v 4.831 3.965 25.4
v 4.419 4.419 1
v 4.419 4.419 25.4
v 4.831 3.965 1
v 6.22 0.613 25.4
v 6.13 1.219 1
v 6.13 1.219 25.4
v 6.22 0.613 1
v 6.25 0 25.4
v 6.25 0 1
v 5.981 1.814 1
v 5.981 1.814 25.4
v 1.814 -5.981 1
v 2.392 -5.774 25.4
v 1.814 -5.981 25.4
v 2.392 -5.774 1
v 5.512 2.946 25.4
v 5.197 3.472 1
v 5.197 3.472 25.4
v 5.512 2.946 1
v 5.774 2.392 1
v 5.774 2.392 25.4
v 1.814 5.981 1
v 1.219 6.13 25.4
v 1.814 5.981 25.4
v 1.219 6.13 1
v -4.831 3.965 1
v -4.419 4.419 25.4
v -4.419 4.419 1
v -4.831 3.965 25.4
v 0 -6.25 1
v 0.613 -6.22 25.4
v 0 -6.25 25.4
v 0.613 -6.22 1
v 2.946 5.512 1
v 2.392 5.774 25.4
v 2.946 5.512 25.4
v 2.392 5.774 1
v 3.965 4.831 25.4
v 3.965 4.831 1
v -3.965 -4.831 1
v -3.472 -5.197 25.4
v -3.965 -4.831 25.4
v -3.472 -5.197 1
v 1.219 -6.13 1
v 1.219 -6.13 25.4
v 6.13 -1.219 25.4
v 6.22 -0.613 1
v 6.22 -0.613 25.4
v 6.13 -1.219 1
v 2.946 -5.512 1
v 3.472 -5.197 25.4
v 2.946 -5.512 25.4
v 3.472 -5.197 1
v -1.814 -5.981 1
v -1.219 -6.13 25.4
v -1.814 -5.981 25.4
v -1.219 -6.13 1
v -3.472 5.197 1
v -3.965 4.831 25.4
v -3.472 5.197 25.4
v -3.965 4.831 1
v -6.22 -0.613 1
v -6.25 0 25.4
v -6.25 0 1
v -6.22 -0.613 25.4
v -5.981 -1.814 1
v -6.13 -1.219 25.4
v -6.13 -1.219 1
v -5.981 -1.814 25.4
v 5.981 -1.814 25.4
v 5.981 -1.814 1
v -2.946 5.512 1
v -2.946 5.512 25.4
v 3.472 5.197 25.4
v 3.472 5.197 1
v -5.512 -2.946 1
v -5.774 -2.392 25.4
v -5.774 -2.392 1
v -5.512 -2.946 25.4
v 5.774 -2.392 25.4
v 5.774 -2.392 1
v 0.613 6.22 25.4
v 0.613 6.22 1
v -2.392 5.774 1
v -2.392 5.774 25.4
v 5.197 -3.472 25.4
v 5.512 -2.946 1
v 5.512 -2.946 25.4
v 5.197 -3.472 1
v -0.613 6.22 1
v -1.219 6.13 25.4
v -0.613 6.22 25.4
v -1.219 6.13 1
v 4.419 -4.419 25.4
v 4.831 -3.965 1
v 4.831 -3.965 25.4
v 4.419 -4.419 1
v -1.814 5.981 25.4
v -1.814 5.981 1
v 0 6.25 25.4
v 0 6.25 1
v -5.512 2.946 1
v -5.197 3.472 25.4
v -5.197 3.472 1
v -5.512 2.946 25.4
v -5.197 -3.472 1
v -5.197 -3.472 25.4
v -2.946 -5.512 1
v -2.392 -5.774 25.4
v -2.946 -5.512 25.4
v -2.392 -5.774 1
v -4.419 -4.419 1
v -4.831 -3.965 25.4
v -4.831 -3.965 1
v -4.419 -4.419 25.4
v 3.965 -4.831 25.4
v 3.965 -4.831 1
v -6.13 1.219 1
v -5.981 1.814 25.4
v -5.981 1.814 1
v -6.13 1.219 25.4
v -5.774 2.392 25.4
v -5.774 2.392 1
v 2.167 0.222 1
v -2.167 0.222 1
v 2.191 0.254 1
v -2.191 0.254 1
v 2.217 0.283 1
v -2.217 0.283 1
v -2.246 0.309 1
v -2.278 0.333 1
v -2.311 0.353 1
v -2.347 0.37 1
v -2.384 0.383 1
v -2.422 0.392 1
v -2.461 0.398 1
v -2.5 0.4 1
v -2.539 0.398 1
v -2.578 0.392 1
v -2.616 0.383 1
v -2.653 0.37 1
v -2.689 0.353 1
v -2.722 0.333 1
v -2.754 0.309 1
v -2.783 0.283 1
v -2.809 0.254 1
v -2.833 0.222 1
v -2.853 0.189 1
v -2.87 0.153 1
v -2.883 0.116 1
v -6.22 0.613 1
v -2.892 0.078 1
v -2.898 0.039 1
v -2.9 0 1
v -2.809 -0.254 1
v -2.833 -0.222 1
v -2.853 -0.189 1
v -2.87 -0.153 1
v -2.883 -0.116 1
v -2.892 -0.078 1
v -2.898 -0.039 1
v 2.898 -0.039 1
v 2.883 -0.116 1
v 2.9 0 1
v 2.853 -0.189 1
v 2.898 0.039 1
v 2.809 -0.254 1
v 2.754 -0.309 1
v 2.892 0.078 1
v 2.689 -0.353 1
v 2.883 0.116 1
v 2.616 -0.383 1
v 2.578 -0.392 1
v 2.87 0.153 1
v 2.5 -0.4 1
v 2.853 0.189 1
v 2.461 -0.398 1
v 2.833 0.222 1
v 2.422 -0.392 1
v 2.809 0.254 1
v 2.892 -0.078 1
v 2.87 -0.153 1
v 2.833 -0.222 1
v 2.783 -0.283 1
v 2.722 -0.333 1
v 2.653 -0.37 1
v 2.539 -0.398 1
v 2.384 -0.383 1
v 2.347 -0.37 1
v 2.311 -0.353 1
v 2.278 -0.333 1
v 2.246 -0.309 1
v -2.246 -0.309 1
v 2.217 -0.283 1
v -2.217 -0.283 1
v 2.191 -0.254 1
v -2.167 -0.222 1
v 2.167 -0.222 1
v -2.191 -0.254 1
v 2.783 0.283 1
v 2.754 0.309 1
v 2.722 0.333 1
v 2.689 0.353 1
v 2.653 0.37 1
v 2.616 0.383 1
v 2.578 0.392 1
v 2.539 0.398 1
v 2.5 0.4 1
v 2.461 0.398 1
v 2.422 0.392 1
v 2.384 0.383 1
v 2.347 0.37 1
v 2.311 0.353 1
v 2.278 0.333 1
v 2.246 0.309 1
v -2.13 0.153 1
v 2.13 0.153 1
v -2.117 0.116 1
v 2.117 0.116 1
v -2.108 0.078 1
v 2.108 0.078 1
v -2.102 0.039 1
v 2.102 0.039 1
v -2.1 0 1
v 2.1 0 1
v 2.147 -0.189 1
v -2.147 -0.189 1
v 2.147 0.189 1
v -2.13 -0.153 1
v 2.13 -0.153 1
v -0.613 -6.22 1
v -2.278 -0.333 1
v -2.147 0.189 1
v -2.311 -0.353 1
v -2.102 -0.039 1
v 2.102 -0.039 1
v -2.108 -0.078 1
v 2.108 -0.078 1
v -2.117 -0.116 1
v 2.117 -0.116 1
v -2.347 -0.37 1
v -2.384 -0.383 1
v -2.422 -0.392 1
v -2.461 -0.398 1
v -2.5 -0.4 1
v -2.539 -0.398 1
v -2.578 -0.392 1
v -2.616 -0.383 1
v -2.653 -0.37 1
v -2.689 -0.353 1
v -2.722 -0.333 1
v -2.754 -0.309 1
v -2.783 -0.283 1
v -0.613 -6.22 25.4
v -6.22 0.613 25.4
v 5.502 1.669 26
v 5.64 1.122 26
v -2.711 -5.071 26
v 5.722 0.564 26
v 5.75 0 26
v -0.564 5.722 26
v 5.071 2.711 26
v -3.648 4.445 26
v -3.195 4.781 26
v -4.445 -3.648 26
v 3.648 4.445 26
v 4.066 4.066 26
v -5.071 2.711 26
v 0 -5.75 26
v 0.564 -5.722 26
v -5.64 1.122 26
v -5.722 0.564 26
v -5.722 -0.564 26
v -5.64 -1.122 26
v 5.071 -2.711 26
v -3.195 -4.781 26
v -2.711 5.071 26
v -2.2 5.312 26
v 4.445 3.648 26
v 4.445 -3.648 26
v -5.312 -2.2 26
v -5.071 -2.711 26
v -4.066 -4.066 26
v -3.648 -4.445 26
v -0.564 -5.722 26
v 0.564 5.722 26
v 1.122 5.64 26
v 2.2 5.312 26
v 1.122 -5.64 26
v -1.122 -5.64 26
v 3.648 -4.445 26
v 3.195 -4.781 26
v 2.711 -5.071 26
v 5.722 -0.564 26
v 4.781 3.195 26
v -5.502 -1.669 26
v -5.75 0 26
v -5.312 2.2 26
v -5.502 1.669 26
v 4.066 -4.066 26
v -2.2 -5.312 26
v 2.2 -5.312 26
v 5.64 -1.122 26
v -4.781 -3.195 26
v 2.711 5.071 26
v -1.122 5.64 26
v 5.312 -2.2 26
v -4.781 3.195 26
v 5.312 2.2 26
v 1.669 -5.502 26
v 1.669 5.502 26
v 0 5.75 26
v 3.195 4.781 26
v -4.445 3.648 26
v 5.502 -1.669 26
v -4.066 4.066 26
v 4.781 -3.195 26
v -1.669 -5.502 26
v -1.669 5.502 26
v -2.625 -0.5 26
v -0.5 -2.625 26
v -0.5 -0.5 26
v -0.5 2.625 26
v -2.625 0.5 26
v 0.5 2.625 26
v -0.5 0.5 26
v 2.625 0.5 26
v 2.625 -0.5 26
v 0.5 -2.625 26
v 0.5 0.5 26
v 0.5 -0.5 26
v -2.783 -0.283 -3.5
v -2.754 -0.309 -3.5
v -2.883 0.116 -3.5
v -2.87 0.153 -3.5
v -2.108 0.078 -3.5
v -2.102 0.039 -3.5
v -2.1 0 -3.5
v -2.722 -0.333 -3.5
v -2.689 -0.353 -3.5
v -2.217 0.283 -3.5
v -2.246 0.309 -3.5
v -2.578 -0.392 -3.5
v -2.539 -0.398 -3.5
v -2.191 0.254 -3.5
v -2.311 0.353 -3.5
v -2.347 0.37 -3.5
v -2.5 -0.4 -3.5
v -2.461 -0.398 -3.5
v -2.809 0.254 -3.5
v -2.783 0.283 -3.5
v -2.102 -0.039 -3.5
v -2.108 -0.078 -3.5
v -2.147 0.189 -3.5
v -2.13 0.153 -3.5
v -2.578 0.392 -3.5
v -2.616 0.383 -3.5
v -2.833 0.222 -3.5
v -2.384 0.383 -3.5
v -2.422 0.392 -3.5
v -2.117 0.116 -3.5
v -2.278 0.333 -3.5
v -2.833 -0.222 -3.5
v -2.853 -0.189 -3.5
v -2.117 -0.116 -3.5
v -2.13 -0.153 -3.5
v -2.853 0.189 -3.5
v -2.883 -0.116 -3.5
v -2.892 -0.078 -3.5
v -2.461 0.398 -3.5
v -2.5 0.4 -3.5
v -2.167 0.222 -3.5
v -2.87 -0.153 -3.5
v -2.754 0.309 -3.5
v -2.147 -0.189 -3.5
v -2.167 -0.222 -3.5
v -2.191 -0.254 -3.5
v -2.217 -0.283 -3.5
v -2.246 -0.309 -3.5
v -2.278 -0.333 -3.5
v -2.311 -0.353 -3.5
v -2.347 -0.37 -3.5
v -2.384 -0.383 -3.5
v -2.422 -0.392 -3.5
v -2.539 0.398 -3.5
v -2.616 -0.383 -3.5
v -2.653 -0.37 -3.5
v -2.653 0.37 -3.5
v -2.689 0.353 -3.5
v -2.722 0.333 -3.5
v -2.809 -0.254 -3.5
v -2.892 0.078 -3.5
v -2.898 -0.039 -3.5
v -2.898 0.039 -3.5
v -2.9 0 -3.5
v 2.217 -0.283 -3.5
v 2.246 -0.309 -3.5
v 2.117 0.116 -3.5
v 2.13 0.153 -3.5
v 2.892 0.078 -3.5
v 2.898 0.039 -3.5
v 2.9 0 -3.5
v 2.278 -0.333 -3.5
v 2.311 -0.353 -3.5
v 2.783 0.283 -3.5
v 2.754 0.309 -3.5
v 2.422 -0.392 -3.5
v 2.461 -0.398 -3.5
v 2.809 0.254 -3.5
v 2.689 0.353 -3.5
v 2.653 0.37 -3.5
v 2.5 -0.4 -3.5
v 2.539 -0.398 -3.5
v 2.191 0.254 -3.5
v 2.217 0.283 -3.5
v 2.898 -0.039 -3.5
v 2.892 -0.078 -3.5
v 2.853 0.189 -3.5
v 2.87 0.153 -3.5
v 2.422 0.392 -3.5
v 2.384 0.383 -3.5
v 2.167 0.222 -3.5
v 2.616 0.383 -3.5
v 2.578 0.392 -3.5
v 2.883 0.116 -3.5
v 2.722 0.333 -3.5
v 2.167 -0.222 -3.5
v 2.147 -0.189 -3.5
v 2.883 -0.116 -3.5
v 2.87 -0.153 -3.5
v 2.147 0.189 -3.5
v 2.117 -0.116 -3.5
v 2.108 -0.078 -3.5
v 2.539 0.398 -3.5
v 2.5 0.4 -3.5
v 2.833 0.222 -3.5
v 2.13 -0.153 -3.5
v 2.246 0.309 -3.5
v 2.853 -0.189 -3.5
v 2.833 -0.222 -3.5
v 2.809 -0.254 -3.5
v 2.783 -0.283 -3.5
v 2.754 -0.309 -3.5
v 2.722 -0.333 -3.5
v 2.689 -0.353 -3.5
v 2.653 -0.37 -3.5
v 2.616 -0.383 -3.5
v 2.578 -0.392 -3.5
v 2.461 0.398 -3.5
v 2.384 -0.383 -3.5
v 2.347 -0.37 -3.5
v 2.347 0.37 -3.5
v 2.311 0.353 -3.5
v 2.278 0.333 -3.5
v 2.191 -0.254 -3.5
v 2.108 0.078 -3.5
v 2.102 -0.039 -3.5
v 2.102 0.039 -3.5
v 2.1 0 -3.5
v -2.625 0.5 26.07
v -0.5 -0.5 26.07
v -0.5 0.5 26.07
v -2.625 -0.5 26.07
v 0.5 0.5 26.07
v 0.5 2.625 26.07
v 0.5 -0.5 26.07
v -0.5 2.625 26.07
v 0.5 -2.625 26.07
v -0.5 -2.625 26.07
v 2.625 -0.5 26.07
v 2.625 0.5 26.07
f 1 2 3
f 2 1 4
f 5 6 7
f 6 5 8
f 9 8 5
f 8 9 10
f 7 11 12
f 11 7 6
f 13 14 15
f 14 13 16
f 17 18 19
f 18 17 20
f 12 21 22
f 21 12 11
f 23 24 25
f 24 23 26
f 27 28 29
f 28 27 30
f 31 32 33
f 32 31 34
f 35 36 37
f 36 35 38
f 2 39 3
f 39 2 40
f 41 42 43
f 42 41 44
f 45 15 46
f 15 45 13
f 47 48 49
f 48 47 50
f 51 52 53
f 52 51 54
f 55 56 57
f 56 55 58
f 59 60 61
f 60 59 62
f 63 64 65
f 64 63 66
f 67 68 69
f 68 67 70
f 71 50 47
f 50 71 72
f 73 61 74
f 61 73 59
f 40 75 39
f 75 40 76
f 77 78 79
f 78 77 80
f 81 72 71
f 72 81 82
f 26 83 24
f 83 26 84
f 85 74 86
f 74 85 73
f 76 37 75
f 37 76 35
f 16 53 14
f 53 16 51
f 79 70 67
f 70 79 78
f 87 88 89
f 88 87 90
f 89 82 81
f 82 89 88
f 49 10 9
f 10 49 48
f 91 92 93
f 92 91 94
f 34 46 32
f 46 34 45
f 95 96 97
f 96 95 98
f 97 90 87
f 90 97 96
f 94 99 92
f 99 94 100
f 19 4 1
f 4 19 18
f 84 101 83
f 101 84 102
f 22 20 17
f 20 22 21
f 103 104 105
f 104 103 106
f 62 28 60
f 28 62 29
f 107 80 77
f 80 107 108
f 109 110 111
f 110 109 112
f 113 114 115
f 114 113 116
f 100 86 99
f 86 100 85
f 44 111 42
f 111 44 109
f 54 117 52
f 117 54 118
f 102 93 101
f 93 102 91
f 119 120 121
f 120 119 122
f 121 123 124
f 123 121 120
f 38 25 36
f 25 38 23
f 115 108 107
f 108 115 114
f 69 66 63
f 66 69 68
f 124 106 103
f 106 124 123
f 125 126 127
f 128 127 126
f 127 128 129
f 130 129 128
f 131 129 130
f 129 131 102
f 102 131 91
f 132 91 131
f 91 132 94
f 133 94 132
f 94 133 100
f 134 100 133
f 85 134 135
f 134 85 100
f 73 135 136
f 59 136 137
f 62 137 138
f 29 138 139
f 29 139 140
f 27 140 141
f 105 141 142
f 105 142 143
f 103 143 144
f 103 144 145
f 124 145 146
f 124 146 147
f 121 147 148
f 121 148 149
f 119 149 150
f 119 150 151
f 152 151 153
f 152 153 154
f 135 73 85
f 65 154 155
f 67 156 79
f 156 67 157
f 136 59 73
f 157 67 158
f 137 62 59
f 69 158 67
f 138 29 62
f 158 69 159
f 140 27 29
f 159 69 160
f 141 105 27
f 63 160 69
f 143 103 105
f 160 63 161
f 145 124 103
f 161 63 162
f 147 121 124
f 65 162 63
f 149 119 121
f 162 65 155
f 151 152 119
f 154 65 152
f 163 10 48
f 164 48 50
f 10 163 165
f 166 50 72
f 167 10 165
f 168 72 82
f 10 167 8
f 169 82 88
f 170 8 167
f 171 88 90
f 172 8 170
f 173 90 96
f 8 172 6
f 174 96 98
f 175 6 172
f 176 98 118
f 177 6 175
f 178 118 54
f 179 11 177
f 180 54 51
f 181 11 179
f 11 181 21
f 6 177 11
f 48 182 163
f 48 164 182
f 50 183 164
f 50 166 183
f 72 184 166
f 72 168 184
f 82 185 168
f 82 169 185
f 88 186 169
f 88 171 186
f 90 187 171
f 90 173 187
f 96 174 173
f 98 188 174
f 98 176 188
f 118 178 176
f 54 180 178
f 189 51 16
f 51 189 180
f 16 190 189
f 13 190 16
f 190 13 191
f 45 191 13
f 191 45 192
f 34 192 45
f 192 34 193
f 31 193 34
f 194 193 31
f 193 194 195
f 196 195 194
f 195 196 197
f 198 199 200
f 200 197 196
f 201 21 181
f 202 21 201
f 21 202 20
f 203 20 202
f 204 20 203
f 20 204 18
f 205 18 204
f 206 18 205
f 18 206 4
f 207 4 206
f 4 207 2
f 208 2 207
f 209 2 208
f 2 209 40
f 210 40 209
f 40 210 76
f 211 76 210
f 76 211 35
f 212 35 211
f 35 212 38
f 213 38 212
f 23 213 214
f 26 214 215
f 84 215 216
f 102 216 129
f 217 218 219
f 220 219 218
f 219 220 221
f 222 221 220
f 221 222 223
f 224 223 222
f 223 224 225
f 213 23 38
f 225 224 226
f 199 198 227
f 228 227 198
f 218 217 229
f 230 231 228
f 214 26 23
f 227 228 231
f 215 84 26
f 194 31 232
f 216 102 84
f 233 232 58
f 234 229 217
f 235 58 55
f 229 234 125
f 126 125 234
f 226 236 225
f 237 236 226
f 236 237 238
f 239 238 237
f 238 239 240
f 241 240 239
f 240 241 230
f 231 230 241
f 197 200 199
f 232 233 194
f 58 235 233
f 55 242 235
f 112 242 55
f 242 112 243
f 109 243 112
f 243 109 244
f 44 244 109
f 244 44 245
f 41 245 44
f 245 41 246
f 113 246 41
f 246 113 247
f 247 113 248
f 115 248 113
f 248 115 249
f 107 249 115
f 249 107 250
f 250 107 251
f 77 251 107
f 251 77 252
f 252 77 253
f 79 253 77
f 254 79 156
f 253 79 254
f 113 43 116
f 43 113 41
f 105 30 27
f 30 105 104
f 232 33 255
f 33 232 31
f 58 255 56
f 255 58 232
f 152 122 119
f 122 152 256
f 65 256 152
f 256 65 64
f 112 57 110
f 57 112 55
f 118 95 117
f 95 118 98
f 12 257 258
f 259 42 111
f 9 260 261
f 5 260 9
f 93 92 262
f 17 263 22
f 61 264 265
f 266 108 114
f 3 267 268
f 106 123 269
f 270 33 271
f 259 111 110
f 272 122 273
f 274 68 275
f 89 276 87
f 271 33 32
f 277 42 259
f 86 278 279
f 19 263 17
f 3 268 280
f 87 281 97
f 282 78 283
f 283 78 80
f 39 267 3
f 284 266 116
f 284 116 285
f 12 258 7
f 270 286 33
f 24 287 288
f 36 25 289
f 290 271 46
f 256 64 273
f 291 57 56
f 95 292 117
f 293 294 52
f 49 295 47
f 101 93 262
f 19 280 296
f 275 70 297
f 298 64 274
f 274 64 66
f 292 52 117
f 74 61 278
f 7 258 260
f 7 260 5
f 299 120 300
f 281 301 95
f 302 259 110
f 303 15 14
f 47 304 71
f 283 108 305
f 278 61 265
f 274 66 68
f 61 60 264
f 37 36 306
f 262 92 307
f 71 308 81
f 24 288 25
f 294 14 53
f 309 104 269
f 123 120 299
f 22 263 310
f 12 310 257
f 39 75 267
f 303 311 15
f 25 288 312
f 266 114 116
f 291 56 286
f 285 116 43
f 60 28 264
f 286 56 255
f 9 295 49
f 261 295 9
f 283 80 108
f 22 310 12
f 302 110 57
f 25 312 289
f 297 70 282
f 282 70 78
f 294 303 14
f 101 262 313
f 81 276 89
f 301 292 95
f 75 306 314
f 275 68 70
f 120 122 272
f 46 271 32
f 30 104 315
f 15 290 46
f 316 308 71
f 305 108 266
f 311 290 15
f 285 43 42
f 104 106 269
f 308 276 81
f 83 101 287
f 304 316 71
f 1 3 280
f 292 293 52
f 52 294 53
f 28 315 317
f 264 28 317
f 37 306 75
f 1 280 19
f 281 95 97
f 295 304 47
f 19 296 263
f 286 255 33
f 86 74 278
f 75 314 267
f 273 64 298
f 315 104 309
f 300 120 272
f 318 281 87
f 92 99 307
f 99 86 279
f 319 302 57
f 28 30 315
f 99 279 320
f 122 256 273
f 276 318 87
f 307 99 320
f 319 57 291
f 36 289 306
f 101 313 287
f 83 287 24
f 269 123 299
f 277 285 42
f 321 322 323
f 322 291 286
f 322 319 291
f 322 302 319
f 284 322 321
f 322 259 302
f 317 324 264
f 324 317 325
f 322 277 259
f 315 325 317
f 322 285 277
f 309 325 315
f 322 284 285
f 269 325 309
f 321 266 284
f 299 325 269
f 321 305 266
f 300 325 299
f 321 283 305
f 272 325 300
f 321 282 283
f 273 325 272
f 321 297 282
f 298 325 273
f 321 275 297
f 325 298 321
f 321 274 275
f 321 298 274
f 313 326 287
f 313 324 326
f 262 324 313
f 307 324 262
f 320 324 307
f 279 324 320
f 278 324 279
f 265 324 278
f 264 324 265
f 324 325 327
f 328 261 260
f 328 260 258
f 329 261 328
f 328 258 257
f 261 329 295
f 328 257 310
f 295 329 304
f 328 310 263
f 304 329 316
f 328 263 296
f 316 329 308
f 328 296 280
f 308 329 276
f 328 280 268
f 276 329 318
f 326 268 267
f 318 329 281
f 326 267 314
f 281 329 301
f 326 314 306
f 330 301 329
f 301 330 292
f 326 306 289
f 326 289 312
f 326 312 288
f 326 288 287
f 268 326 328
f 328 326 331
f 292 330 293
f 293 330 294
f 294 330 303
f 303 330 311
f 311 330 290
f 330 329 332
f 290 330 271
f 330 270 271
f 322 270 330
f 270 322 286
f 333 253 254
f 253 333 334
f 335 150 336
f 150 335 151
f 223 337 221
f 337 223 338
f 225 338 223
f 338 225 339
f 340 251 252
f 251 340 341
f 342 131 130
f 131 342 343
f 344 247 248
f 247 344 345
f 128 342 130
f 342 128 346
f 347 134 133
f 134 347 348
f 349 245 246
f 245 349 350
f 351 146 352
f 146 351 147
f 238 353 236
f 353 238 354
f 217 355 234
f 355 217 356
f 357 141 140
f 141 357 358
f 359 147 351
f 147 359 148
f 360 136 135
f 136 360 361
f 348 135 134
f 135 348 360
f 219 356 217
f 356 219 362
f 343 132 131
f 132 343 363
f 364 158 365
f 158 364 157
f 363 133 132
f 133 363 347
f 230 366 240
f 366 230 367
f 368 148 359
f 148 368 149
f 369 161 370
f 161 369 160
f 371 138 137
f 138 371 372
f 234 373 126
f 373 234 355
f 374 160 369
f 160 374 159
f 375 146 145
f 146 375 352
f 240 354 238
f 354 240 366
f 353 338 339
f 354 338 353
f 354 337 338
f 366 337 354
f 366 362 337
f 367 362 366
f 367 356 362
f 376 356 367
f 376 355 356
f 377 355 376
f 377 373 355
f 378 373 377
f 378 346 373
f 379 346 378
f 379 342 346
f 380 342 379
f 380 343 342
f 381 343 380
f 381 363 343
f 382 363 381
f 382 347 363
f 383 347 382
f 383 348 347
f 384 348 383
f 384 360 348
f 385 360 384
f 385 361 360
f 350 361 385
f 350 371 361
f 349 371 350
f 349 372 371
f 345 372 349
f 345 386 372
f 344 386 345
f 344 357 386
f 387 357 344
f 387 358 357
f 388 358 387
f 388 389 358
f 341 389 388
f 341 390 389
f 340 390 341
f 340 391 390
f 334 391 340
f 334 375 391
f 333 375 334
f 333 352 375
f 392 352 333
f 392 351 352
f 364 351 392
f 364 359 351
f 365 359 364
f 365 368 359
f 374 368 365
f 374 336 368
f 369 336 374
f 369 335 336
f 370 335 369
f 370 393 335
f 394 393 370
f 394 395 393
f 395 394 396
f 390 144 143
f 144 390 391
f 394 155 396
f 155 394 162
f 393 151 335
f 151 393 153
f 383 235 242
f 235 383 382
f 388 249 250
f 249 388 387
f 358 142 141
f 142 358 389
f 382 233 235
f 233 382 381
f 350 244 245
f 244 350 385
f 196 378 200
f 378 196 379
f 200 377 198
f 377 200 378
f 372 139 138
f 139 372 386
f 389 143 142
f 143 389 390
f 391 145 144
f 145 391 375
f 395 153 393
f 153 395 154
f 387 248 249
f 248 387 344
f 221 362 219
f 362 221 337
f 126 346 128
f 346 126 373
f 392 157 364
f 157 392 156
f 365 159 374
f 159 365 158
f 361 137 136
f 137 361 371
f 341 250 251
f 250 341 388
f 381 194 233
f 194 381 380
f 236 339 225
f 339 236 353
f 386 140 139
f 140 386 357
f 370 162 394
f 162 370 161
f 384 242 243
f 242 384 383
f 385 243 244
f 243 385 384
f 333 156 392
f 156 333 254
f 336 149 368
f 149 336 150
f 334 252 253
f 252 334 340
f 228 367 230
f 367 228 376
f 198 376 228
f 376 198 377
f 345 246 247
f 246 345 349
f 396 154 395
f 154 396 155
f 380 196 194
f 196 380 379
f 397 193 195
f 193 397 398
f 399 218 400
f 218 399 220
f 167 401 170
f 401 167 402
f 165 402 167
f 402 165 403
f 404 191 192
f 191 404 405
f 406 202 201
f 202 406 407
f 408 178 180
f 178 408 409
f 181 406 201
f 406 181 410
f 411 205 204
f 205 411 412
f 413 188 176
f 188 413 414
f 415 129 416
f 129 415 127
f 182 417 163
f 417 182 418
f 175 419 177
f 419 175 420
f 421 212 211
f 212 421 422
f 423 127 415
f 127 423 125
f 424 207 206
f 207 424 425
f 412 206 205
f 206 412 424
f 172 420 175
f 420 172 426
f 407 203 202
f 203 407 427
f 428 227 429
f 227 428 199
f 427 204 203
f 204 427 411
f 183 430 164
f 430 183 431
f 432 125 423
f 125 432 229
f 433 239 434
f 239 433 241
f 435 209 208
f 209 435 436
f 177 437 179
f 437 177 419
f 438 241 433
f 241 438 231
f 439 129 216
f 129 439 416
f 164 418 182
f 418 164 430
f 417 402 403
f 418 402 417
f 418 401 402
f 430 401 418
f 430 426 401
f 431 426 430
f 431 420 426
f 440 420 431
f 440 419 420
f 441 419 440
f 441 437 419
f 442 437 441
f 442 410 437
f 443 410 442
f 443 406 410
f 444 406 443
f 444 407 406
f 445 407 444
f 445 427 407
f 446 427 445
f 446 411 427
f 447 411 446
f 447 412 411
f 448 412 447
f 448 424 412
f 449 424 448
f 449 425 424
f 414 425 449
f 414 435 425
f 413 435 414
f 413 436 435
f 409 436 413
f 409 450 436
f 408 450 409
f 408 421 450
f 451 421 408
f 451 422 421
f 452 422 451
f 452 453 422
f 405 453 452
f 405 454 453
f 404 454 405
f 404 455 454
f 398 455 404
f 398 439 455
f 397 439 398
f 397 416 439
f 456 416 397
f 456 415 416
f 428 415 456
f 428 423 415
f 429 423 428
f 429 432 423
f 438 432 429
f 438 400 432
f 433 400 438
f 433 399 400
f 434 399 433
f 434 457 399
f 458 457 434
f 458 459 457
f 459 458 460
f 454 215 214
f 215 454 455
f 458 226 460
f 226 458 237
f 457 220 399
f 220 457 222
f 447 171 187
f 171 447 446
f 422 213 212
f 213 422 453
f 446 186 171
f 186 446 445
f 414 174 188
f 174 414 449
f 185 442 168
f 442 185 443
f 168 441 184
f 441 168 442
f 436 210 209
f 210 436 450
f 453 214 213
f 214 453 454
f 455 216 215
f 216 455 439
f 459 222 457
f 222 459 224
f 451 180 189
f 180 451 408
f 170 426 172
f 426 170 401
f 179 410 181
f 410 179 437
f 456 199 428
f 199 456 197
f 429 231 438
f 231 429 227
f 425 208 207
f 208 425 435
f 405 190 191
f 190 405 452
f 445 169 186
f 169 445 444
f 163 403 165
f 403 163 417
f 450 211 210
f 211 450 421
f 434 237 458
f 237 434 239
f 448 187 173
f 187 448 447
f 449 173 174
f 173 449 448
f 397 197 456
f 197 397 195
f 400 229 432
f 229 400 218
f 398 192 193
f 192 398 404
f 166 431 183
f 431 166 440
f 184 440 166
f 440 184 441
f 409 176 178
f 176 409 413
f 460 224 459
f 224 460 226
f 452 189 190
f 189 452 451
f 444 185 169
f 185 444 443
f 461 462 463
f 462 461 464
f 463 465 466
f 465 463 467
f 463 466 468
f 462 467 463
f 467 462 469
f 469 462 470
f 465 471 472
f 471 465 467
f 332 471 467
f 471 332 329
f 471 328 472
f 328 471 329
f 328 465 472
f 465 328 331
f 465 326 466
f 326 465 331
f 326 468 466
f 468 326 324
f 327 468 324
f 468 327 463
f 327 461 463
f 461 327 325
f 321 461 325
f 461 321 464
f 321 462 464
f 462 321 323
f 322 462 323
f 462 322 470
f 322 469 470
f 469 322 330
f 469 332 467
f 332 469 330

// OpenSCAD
$fn = 64;

body_diameter = 12.5;
body_height = 25;
lead_spacing = 5;
lead_diameter = 0.8;
lead_length_below = 3.5;
body_lift = 1;
lead_stub = 1;
top_chamfer = 0.6;

module lead(x) {
    color([0.75, 0.75, 0.75])
    translate([x, 0, -lead_length_below])
        cylinder(h = lead_length_below + body_lift + lead_stub, d = lead_diameter);
}

module capacitor_body() {
    color([0.16, 0.18, 0.19])
    union() {
        translate([0, 0, body_lift])
            cylinder(h = body_height - top_chamfer, d = body_diameter);
        translate([0, 0, body_lift + body_height - top_chamfer])
            cylinder(h = top_chamfer, d1 = body_diameter, d2 = body_diameter * 0.92);
    }
}

module top_vent() {
    color([0.78, 0.78, 0.78])
    translate([0, 0, body_lift + body_height - 0.05])
    linear_extrude(height = 0.12)
    union() {
        square([body_diameter * 0.42, body_diameter * 0.08], center = true);
        square([body_diameter * 0.08, body_diameter * 0.42], center = true);
    }
}

lead(-lead_spacing / 2);
lead( lead_spacing / 2);
capacitor_body();
top_vent();
